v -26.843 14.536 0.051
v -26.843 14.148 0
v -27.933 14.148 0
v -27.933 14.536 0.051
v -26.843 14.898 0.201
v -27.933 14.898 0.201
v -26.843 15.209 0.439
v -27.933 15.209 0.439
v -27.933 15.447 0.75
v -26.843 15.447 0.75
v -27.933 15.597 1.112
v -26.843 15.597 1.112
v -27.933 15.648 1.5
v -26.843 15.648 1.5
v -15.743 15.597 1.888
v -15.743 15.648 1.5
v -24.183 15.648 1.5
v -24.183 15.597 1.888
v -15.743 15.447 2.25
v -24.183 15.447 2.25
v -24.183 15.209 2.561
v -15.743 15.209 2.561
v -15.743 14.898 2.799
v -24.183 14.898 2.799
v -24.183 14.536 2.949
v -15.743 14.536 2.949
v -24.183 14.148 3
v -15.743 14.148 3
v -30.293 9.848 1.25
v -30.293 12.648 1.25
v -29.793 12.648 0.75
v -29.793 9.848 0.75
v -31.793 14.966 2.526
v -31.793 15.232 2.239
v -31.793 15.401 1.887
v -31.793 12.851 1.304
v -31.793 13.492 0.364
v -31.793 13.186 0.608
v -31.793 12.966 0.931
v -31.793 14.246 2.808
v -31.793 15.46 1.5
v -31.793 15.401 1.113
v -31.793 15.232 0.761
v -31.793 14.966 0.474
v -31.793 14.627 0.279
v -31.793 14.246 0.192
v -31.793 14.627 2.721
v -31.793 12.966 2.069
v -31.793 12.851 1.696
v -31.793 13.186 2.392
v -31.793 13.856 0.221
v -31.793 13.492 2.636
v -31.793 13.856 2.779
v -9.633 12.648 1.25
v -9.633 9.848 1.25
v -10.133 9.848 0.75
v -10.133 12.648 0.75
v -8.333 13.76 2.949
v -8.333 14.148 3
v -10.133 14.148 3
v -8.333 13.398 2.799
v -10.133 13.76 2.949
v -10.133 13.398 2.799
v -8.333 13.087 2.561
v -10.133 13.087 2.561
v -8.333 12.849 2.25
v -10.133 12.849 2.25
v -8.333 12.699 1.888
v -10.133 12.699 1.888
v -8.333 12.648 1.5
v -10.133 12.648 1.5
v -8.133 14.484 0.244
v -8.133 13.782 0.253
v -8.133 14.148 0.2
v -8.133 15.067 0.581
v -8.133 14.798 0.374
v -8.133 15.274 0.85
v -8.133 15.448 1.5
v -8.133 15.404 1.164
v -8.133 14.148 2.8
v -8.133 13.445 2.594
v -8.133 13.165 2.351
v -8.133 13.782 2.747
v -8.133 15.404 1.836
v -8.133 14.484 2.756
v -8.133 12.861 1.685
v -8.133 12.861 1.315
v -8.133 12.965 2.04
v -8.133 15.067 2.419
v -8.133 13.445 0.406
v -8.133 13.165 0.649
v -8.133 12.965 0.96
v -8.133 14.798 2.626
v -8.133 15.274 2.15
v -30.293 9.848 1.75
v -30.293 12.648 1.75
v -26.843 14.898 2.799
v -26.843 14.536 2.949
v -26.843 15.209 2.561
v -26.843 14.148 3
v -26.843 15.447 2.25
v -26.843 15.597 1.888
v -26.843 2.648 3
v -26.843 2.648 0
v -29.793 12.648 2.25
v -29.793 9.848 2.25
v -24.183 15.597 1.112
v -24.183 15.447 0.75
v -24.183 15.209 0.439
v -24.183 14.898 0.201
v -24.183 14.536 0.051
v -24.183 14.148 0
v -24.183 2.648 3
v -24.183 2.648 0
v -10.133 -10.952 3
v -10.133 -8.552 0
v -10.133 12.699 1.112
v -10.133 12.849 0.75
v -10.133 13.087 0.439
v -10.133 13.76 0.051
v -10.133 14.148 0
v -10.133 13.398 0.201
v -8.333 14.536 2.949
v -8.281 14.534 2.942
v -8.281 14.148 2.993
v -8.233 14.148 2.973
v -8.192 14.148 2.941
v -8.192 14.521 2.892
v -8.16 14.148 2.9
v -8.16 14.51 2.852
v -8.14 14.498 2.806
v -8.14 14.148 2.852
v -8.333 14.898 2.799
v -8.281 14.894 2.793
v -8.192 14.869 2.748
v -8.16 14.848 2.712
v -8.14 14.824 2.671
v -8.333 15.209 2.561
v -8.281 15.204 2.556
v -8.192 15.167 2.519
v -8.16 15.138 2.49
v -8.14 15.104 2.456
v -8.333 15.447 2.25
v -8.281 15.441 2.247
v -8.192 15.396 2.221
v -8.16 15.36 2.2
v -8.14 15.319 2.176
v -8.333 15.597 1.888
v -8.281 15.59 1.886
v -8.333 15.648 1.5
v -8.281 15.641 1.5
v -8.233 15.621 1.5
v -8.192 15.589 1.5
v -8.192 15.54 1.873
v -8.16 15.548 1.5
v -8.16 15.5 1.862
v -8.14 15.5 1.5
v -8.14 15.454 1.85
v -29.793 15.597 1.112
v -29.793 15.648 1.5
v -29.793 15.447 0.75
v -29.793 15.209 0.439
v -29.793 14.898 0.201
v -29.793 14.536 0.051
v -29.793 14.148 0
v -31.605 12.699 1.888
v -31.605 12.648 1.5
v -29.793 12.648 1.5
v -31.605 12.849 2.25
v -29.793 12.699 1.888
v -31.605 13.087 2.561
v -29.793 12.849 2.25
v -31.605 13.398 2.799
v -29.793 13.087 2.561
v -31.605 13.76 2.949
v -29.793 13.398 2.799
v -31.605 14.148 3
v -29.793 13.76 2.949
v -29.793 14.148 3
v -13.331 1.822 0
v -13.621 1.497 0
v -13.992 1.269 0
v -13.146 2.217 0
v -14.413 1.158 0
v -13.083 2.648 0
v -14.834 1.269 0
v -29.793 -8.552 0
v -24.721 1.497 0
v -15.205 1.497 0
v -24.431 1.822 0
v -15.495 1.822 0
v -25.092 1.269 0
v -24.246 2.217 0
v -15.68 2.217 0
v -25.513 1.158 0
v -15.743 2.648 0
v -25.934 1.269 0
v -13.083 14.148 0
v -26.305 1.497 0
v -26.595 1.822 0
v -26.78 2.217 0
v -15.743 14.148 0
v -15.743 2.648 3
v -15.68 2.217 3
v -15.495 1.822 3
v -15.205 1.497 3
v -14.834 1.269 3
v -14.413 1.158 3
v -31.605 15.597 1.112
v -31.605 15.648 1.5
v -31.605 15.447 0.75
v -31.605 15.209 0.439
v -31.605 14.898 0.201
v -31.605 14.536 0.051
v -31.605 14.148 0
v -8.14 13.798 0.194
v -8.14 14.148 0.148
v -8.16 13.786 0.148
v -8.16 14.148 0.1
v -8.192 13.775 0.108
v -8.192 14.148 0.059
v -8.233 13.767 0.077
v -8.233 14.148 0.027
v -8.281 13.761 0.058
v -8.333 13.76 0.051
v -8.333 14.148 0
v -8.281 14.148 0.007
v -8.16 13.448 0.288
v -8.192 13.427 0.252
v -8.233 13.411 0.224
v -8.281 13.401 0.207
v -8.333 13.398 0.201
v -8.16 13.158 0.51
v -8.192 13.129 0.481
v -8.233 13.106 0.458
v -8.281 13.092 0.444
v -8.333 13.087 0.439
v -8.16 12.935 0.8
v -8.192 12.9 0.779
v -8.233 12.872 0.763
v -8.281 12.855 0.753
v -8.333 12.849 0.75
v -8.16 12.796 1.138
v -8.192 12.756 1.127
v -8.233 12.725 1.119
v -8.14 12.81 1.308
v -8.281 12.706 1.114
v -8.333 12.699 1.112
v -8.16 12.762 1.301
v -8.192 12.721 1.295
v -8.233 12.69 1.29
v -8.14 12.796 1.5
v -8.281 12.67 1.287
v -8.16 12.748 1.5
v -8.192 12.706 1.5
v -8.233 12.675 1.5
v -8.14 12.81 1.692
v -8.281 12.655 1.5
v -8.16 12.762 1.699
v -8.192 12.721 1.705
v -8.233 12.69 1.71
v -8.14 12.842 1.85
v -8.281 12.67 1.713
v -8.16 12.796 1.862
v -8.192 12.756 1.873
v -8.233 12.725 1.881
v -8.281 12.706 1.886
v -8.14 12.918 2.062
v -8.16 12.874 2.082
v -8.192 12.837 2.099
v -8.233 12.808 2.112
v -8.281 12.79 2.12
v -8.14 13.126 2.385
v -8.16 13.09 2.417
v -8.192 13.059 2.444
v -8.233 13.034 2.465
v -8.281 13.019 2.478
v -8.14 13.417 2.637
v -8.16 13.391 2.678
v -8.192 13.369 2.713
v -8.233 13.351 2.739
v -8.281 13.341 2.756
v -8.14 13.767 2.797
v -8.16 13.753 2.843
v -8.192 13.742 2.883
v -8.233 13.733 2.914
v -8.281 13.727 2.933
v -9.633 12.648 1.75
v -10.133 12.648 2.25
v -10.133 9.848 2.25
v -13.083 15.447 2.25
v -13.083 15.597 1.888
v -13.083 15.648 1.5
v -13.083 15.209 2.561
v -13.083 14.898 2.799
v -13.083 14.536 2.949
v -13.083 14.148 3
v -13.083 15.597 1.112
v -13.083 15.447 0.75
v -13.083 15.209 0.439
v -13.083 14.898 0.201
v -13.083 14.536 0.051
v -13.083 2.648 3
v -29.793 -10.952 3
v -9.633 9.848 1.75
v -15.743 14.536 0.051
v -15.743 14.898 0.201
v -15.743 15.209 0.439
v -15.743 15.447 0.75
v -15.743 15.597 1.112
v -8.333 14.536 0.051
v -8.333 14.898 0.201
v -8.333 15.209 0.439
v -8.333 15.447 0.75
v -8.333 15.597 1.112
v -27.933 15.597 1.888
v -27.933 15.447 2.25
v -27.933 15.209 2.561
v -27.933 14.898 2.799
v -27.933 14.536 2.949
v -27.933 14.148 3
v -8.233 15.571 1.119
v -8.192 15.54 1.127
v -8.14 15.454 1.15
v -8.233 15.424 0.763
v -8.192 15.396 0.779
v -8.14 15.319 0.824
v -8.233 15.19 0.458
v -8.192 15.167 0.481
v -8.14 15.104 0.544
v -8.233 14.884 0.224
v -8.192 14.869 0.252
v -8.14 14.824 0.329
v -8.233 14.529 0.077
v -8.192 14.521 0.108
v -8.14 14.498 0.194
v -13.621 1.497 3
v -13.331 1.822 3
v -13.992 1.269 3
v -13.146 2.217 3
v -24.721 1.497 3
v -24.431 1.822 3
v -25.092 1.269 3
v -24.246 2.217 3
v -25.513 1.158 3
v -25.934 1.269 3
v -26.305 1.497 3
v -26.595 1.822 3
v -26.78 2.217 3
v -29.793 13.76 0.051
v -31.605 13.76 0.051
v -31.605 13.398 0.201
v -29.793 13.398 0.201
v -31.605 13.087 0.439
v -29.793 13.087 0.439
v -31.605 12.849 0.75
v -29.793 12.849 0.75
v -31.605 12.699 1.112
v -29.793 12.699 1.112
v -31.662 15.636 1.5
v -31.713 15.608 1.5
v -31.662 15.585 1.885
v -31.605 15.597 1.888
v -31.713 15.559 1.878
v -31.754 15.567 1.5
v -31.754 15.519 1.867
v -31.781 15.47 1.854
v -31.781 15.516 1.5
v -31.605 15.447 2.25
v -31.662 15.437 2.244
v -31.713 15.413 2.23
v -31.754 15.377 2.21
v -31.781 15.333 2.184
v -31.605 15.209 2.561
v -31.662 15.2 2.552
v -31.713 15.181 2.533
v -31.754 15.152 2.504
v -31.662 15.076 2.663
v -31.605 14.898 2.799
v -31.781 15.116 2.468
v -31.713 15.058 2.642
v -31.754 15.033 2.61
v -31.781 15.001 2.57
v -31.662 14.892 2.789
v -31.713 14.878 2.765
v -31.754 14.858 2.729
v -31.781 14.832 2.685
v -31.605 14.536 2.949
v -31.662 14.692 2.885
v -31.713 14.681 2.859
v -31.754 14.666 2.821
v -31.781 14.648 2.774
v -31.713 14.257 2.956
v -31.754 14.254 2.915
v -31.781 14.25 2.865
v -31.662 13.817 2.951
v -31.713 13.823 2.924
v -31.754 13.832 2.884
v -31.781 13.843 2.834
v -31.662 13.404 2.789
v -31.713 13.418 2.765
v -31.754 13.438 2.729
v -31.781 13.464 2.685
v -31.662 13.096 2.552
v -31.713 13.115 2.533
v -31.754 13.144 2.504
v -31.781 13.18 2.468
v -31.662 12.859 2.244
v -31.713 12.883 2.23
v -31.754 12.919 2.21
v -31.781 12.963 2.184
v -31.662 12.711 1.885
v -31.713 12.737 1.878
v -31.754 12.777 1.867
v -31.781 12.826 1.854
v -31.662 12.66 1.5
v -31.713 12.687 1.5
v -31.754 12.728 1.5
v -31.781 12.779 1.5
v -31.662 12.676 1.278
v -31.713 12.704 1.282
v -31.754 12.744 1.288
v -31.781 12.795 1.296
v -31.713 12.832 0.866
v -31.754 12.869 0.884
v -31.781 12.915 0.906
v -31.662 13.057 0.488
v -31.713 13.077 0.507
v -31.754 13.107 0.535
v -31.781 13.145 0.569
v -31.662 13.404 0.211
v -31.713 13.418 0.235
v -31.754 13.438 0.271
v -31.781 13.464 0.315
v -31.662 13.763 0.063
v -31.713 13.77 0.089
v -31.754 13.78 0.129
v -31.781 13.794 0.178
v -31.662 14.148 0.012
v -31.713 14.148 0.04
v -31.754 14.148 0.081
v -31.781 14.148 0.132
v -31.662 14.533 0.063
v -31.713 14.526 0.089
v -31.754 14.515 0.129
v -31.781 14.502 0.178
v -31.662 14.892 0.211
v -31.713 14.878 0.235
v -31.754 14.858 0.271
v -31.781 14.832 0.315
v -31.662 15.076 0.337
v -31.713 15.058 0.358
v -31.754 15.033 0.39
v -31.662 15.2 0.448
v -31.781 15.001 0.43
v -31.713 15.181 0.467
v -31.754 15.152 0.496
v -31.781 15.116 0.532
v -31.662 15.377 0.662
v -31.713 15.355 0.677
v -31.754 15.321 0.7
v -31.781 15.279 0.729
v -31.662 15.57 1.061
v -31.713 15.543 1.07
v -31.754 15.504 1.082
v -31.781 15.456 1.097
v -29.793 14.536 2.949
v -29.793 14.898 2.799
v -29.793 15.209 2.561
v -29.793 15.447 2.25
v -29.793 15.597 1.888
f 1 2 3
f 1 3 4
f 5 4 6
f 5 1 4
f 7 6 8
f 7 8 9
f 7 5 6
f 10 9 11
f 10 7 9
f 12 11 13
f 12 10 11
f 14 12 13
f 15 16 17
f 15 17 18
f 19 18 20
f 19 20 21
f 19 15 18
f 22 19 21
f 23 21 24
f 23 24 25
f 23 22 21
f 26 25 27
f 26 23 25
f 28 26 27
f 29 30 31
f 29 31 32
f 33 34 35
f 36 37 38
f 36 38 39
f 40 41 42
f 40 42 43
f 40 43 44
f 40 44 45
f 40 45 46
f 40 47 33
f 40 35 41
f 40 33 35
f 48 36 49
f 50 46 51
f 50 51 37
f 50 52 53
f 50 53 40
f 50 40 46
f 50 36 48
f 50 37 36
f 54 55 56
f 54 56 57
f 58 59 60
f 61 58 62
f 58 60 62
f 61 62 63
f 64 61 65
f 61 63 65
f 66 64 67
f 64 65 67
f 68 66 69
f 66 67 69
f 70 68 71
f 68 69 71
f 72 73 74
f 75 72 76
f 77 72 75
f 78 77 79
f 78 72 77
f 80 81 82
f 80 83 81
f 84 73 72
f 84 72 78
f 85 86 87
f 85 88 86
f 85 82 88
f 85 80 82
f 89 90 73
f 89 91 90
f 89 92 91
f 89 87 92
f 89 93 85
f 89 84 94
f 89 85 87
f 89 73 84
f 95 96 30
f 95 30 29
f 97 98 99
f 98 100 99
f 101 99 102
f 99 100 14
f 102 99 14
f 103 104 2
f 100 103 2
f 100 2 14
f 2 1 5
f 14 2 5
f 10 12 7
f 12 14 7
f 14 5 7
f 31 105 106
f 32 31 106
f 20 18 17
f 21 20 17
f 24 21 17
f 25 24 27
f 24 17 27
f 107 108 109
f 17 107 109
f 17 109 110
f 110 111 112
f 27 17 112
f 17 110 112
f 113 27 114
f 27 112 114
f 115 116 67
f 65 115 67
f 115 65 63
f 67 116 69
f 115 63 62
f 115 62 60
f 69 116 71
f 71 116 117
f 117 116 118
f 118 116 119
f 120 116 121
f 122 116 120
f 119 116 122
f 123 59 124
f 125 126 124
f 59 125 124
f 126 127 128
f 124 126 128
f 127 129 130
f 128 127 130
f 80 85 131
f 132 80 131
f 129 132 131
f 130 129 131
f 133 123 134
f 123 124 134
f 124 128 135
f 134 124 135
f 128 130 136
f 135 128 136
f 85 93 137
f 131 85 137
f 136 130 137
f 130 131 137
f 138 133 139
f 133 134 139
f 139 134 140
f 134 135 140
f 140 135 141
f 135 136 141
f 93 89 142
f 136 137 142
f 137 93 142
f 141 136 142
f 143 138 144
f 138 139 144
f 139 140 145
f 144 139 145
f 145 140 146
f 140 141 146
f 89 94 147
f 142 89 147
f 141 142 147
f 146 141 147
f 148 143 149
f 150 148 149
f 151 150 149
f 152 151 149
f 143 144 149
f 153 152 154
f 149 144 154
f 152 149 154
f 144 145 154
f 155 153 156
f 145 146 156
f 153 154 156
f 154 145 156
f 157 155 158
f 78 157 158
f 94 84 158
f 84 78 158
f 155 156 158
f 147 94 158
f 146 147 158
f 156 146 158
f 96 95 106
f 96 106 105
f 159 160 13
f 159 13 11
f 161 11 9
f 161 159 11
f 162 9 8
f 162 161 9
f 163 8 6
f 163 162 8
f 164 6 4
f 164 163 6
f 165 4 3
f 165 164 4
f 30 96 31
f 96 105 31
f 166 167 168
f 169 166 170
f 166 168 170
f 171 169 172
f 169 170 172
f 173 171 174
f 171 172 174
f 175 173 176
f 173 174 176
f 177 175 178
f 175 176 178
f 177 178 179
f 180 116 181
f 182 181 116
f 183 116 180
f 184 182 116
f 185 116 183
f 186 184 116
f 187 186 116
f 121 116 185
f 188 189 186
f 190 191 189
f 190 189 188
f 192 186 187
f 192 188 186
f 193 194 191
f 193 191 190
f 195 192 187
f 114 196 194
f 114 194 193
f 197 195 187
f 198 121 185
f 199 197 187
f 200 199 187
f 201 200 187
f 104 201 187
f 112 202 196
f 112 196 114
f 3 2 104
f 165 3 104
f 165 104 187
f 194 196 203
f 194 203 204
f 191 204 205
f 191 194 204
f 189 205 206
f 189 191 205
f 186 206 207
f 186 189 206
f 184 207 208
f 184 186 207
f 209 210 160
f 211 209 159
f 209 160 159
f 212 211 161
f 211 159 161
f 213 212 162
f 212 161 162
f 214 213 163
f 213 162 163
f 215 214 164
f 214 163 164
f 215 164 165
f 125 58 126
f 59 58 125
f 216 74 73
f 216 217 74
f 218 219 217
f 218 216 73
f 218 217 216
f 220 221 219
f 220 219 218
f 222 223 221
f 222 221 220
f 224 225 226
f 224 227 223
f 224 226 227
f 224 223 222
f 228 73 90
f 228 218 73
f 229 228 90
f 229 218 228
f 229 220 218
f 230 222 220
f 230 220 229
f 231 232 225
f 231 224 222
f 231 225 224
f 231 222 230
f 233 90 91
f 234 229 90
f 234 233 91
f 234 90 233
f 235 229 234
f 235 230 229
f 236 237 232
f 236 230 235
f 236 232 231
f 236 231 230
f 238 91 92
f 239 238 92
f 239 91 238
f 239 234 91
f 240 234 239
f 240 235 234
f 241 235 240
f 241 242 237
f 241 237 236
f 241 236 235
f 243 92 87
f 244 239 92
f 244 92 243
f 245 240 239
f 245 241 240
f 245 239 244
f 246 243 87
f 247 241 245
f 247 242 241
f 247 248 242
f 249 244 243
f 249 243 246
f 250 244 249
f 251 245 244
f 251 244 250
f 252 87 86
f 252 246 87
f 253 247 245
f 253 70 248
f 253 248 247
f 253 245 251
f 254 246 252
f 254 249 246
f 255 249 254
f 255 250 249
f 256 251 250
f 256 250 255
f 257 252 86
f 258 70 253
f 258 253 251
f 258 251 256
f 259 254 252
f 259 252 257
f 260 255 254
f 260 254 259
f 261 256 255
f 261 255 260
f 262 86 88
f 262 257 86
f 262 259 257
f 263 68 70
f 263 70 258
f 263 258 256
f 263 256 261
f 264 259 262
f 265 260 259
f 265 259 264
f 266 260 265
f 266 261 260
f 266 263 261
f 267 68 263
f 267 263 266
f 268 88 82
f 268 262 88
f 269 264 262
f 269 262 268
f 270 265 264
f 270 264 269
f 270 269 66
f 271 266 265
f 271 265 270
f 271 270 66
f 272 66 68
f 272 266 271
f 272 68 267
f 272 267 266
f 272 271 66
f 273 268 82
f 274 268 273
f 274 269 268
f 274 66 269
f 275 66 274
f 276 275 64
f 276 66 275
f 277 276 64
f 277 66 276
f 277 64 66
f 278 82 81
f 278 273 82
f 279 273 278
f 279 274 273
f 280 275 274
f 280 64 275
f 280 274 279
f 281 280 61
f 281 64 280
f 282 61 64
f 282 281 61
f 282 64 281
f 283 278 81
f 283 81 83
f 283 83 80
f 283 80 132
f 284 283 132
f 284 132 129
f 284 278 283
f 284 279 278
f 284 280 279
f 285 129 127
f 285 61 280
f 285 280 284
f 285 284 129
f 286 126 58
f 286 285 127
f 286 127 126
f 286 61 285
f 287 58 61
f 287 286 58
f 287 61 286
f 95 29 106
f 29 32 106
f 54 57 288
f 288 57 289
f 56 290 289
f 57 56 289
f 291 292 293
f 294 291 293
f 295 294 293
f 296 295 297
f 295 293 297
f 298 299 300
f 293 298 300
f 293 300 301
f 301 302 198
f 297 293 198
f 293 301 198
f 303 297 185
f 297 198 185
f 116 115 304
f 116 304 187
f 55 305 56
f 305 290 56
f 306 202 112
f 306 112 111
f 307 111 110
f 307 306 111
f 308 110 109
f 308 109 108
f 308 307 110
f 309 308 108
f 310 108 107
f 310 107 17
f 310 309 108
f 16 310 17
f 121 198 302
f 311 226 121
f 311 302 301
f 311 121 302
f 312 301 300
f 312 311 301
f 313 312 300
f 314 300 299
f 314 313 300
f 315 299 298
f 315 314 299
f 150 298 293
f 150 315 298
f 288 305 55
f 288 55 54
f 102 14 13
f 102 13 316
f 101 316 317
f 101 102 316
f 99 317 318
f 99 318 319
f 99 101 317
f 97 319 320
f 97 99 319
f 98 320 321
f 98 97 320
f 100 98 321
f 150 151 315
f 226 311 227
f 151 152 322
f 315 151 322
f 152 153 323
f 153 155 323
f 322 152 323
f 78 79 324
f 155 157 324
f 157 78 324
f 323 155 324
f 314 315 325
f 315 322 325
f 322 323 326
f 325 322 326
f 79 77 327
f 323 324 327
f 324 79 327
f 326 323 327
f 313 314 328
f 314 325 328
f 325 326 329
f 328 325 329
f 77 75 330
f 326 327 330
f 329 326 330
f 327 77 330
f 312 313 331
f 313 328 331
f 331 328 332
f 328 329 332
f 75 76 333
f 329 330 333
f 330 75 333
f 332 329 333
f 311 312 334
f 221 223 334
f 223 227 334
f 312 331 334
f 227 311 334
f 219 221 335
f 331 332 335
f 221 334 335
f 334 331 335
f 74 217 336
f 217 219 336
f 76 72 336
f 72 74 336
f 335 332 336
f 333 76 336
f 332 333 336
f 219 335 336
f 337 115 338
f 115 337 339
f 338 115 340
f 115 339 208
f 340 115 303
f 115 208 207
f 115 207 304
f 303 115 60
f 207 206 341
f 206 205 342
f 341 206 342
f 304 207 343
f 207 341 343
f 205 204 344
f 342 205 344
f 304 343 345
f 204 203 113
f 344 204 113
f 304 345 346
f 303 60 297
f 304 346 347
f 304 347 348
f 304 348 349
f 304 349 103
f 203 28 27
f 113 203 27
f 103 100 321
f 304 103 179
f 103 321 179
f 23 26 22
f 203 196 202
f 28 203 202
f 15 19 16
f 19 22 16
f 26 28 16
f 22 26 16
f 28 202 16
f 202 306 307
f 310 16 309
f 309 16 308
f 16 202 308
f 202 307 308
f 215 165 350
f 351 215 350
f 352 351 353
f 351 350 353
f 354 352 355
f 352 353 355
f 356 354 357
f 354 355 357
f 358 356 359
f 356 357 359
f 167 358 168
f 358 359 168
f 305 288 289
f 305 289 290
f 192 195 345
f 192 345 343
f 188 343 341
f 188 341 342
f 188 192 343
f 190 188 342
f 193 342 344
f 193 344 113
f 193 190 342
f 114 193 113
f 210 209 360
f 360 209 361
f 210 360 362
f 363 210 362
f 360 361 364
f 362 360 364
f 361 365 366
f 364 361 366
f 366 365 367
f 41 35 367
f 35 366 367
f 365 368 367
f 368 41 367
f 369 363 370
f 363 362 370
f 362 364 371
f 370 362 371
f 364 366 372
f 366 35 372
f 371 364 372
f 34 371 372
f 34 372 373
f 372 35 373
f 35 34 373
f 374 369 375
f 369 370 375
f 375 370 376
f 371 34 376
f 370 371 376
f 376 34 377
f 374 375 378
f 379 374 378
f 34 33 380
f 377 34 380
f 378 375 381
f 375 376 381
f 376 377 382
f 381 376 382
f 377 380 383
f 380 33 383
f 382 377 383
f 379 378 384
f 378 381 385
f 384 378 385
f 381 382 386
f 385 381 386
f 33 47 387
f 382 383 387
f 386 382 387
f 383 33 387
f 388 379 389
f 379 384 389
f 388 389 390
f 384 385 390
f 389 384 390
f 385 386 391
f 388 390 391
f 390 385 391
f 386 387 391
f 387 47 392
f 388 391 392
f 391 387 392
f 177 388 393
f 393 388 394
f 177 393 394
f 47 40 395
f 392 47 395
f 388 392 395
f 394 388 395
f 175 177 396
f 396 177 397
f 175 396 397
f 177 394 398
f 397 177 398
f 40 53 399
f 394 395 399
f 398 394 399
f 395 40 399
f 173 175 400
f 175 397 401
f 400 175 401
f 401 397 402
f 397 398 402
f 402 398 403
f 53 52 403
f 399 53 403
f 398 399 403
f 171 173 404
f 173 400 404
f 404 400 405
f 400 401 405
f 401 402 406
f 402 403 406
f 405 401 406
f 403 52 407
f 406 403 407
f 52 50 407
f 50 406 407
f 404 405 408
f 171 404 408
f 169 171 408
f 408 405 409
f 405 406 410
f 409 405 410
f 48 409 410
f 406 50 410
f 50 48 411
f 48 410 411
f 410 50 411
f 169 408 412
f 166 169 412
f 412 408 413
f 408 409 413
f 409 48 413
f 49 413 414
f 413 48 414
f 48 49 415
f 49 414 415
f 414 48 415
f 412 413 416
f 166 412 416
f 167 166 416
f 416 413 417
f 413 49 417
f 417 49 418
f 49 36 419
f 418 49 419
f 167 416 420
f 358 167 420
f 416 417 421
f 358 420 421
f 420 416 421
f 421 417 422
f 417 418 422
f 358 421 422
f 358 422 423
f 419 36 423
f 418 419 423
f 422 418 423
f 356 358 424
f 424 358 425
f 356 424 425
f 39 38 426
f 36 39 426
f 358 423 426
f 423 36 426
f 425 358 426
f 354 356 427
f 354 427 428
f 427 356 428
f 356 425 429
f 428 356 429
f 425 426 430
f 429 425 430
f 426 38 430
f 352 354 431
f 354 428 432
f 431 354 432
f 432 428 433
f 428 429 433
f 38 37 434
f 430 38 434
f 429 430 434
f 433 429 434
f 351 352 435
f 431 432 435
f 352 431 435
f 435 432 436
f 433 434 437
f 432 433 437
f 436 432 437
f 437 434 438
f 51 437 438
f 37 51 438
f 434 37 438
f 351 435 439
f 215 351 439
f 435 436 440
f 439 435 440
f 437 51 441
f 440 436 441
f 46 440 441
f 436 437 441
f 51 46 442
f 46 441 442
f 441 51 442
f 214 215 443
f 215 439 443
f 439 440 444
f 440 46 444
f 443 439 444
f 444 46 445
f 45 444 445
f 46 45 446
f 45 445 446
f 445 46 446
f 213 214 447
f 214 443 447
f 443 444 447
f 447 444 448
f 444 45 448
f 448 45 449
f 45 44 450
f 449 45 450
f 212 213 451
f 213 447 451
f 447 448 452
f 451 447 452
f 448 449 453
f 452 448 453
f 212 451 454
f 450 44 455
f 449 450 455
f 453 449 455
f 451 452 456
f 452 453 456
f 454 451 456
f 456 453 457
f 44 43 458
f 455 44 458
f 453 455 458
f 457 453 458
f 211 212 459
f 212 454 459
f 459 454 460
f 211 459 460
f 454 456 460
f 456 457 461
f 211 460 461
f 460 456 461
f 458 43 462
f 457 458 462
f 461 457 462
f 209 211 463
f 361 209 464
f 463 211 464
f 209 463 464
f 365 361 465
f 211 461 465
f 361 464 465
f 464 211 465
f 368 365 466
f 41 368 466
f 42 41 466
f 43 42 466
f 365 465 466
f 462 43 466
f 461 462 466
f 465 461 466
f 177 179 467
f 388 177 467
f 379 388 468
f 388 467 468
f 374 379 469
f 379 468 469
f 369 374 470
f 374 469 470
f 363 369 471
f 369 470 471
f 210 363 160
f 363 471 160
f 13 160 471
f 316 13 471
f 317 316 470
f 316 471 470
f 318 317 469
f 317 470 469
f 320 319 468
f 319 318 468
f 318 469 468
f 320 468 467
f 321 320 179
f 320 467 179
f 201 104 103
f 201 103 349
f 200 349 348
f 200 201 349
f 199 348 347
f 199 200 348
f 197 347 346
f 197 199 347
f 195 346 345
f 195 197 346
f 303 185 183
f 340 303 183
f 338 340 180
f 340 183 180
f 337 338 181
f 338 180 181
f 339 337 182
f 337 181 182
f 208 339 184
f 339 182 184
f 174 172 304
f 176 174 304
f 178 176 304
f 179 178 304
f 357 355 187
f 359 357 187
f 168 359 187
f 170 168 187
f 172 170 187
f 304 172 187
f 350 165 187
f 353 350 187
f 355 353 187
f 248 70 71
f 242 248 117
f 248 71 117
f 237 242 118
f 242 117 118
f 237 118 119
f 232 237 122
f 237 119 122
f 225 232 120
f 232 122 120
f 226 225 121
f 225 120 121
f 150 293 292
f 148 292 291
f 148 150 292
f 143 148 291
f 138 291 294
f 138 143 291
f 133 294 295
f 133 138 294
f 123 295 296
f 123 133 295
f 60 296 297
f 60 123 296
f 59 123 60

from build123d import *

# Parameters (mm, degrees)
F1_DEPTH      = 3
F3_DEPTH      = 2
F5_DEPTH      = 2
F6_DEPTH      = 0.5
F7_SIZE       = 0.49999
F8_DEPTH      = 0.5
F9_SIZE       = 0.49999
F10_DEPTH     = 19.66
F11_R         = 1.4999
F12_T3_DEPTH  = 3
F12_T6_DEPTH  = 3
F12_T9_DEPTH  = 3
F12_T12_DEPTH = 3
F12_T16_DEPTH = 15.94
F12_T19_DEPTH = 10.45
F12_T22_DEPTH = 15.94
F12_T25_DEPTH = 10.45
F14_T3_ANGLE  = 179.9999999988
F14_T6_ANGLE  = 90
F14_T9_ANGLE  = 90.0000000012


# Not quite as in the source:
# - a fillet or chamfer that OpenCascade refuses, or shapes differently, is made with other operations: its cross-section is extruded or revolved along the edge and cut away or added
# - two fillets or chamfers of one size are made in one step
# - a fillet or chamfer is up to 0.001 mm smaller than in the source, because OpenCascade refuses the exact size


with BuildPart() as f1:
    # F0 (on Top) → F1 (new body)
    with BuildSketch(Plane.XY):
        Polygon((-26.8430960169, 15.6478737652), (-29.7930960169, 15.6478737652), (-29.7930960169, -10.9521262348), (-10.1330960169, -10.9521262348), (-10.1330960169, 15.6478737652), (-13.0830960169, 15.6478737652), (-13.0830960169, 1.1478737652), (-15.7430960169, 1.1478737652), (-15.7430960169, 15.6478737652), (-24.1830960169, 15.6478737652), (-24.1830960169, 1.1478737652), (-26.8430960169, 1.1478737652), align=None)
    extrude(amount=F1_DEPTH)

    # F2 (on face) → F3 (join)
    with BuildSketch(Plane.YZ.offset(-10.1330960169)):
        with BuildLine():
            ThreePointArc((14.1478737652, 0), (15.208533937, 0.4393398282), (15.6478737652, 1.5))
            ThreePointArc((15.6478737652, 1.5), (15.208533937, 2.5606601718), (14.1478737652, 3))
            ThreePointArc((14.1478737652, 3), (13.0872135935, 2.5606601718), (12.6478737652, 1.5))
            ThreePointArc((12.6478737652, 1.5), (13.0872135935, 0.4393398282), (14.1478737652, 0))
        make_face()
    extrude(amount=F3_DEPTH)

    # F4 (on face) → F5 (join)
    with BuildSketch(Plane(origin=(-29.7930960169, 0, 0), x_dir=(0, -1, 0), z_dir=(-1, 0, 0))):
        with BuildLine():
            ThreePointArc((-14.1478737652, 0), (-13.0872135935, 0.4393398282), (-12.6478737652, 1.5))
            ThreePointArc((-12.6478737652, 1.5), (-13.0872135935, 2.5606601718), (-14.1478737652, 3))
            ThreePointArc((-14.1478737652, 3), (-15.2085339334, 2.5606601754), (-15.6478737652, 1.5000000103))
            ThreePointArc((-15.6478737652, 1.5000000103), (-15.2085339407, 0.4393398319), (-14.1478737652, 0))
        make_face()
    extrude(amount=F5_DEPTH)

    # F4 (on face) → F10 (cut, through all)
    with BuildSketch(Plane(origin=(-29.7930960169, 0, 0), x_dir=(0, -1, 0), z_dir=(-1, 0, 0))):
        Polygon((10.9521262348, 0), (10.9521262348, 3), (8.5521262348, 0), align=None)
    extrude(amount=-F10_DEPTH, mode=Mode.SUBTRACT)

    # F11 (radius 1.5 in the source; OpenCascade refuses exactly that, so slightly less here)
    f11_edges = [f1.edges().sort_by_distance(p)[0] for p in [
        (-28.318096, 15.647874, 3),
        (-28.318096, 15.647874, 0),
    ]]
    fillet(f11_edges, radius=F11_R)

    # F12: fillet of radius 1.5 on 8 edges, made by hand


with BuildPart() as f6:
    # F4 (on face) → F6 (new body)
    with BuildSketch(Plane(origin=(-29.7930960169, 0, 0), x_dir=(0, -1, 0), z_dir=(-1, 0, 0))):
        Polygon((-12.6478737652, 2.25), (-12.6478737652, 1.5), (-12.6478737652, 0.75), (-9.8478737652, 0.75), (-9.8478737652, 1.5), (-9.8478737652, 2.25), align=None)
    extrude(amount=F6_DEPTH)

    # F7 (size 0.5 in the source; OpenCascade refuses exactly that, so slightly less here)
    f7_edges = [f6.edges().sort_by_distance(p)[0] for p in [
        (-30.293096, 11.247874, 0.75),
        (-30.293096, 11.247874, 2.25),
    ]]
    chamfer(f7_edges, length=F7_SIZE)


with BuildPart() as f8:
    # F2 (on face) → F8 (new body)
    with BuildSketch(Plane.YZ.offset(-10.1330960169)):
        Polygon((12.6478737652, 0.75), (12.6478737652, 1.5), (12.6478737652, 2.25), (9.8478737652, 2.25), (9.8478737652, 0.75), align=None)
    extrude(amount=F8_DEPTH)

    # F9 (size 0.5 in the source; OpenCascade refuses exactly that, so slightly less here)
    f9_edges = [f8.edges().sort_by_distance(p)[0] for p in [
        (-9.633096, 11.247874, 2.25),
        (-9.633096, 11.247874, 0.75),
    ]]
    chamfer(f9_edges, length=F9_SIZE)


with BuildPart() as f12_tool1:
    # F12_s2 → F12_t3 (new body)
    with BuildSketch(Plane.XY):
        with BuildLine():
            ThreePointArc((-26.8430960169, 2.6478737652), (-26.4037561887, 1.5872135935), (-25.3430960169, 1.1478737652))
            Line((-25.3430960169, 1.1478737652), (-26.8430960169, 1.1478737652))
            Line((-26.8430960169, 1.1478737652), (-26.8430960169, 2.6478737652))
        make_face()
    extrude(amount=F12_T3_DEPTH)


with BuildPart() as f12_tool4:
    # F12_s5 → F12_t6 (new body)
    with BuildSketch(Plane.XY):
        with BuildLine():
            ThreePointArc((-25.6830960169, 1.1478737652), (-24.6224358452, 1.5872135935), (-24.1830960169, 2.6478737652))
            Line((-24.1830960169, 2.6478737652), (-24.1830960169, 1.1478737652))
            Line((-24.1830960169, 1.1478737652), (-25.6830960169, 1.1478737652))
        make_face()
    extrude(amount=F12_T6_DEPTH)


with BuildPart() as f12_tool7:
    # F12_s8 → F12_t9 (new body)
    with BuildSketch(Plane.XY):
        with BuildLine():
            ThreePointArc((-15.7430960169, 2.6478737652), (-15.3037561887, 1.5872135935), (-14.2430960169, 1.1478737652))
            Line((-14.2430960169, 1.1478737652), (-15.7430960169, 1.1478737652))
            Line((-15.7430960169, 1.1478737652), (-15.7430960169, 2.6478737652))
        make_face()
    extrude(amount=F12_T9_DEPTH)


with BuildPart() as f12_tool10:
    # F12_s11 → F12_t12 (new body)
    with BuildSketch(Plane.XY):
        with BuildLine():
            ThreePointArc((-13.0830960169, 2.6478737652), (-13.5224358452, 1.5872135935), (-14.5830960169, 1.1478737652))
            Line((-14.5830960169, 1.1478737652), (-13.0830960169, 1.1478737652))
            Line((-13.0830960169, 1.1478737652), (-13.0830960169, 2.6478737652))
        make_face()
    extrude(amount=F12_T12_DEPTH)


with BuildPart() as f1_1:
    add(f1.part)

    # F12_t13: union F12_tool1, F12_tool4, F12_tool7, F12_tool10
    add([f12_tool1.part, f12_tool4.part, f12_tool7.part, f12_tool10.part])


with BuildPart() as f12_tool14:
    # F12_s15 → F12_t16 (new body)
    with BuildSketch(Plane.YZ.offset(-11.9930960169)):
        with BuildLine():
            ThreePointArc((14.1478737652, 0), (15.208533937, 0.4393398282), (15.6478737652, 1.5))
            Line((15.6478737652, 1.5), (15.6478737652, 0))
            Line((15.6478737652, 0), (14.1478737652, 0))
        make_face()
    extrude(amount=-F12_T16_DEPTH)


with BuildPart() as f12_tool17:
    # F12_s18 → F12_t19 (new body)
    with BuildSketch(Plane.YZ.offset(-6.3830960169)):
        with BuildLine():
            ThreePointArc((14.1478737652, 0), (15.208533937, 0.4393398282), (15.6478737652, 1.5))
            Line((15.6478737652, 1.5), (15.6478737652, 0))
            Line((15.6478737652, 0), (14.1478737652, 0))
        make_face()
    extrude(amount=-F12_T19_DEPTH)


with BuildPart() as f12_tool20:
    # F12_s21 → F12_t22 (new body)
    with BuildSketch(Plane.YZ.offset(-11.9930960169)):
        with BuildLine():
            ThreePointArc((15.6478737652, 1.5), (15.208533937, 2.5606601718), (14.1478737652, 3))
            Line((14.1478737652, 3), (15.6478737652, 3))
            Line((15.6478737652, 3), (15.6478737652, 1.5))
        make_face()
    extrude(amount=-F12_T22_DEPTH)


with BuildPart() as f12_tool23:
    # F12_s24 → F12_t25 (new body)
    with BuildSketch(Plane.YZ.offset(-6.3830960169)):
        with BuildLine():
            ThreePointArc((15.6478737652, 1.5), (15.208533937, 2.5606601718), (14.1478737652, 3))
            Line((14.1478737652, 3), (15.6478737652, 3))
            Line((15.6478737652, 3), (15.6478737652, 1.5))
        make_face()
    extrude(amount=-F12_T25_DEPTH)


with BuildPart() as f1_2:
    add(f1_1.part)

    # F12_t26: cut F12_tool14, F12_tool17, F12_tool20, F12_tool23
    add([f12_tool14.part, f12_tool17.part, f12_tool20.part, f12_tool23.part], mode=Mode.SUBTRACT)

    # F14: fillet of radius 0.2 on 1 edges, made by hand


with BuildPart() as f14_tool1:
    # F14_s2 → F14_t3 (revolve)
    with BuildSketch(Plane.XZ.offset(-14.1478737652)):
        with BuildLine():
            ThreePointArc((-8.1330960169, 0.2), (-8.1916746607, 0.0585786438), (-8.3330960169, 0))
            Line((-8.3330960169, 0), (-8.1330960169, 0))
            Line((-8.1330960169, 0), (-8.1330960169, 0.2))
        make_face()
    revolve(axis=Axis((-8.1330960169, 14.1478737652, 1.5), (-1, 0, 0)), revolution_arc=F14_T3_ANGLE)


with BuildPart() as f14_tool4:
    # F14_s5 → F14_t6 (revolve)
    with BuildSketch(Plane.XY.offset(1.5)):
        with BuildLine():
            ThreePointArc((-8.3330960169, 15.6478737652), (-8.1916746607, 15.5892951215), (-8.1330960169, 15.4478737652))
            Line((-8.1330960169, 15.4478737652), (-8.1330960169, 15.6478737652))
            Line((-8.1330960169, 15.6478737652), (-8.3330960169, 15.6478737652))
        make_face()
    revolve(axis=Axis((-8.1330960169, 14.1478737652, 1.5), (-1, 0, 0)), revolution_arc=F14_T6_ANGLE)


with BuildPart() as f14_tool7:
    # F14_s8 → F14_t9 (revolve)
    with BuildSketch(Plane.XZ.offset(-14.1478737652)):
        with BuildLine():
            ThreePointArc((-8.3330960169, 3), (-8.1916746607, 2.9414213562), (-8.1330960169, 2.8))
            Line((-8.1330960169, 2.8), (-8.1330960169, 3))
            Line((-8.1330960169, 3), (-8.3330960169, 3))
        make_face()
    revolve(axis=Axis((-8.1330960169, 14.1478737652, 1.5), (-1, 0, 0)), revolution_arc=F14_T9_ANGLE)


with BuildPart() as f1_3:
    add(f1_2.part)

    # F14_t10: cut F14_tool1, F14_tool4, F14_tool7
    add([f14_tool1.part, f14_tool4.part, f14_tool7.part], mode=Mode.SUBTRACT)

    # F15: fillet of radius 0.2 on 1 edges, made by hand

    # F15_s1 → F15_t2 (revolve, cut)
    with BuildSketch(Plane.XY.offset(1.5)):
        with BuildLine():
            ThreePointArc((-31.5921303315, 15.6482737652), (-31.7345173732, 15.5892951215), (-31.7934960169, 15.4469080798))
            Line((-31.7934960169, 15.4469080798), (-31.8136325855, 15.4469080798))
            ThreePointArc((-31.8136325855, 15.4469080798), (-31.8132325855, 15.5473909225), (-31.8132325855, 15.6478737652))
            Line((-31.8132325855, 15.6478737652), (-31.7930960169, 15.6680103338))
            ThreePointArc((-31.7930960169, 15.6680103338), (-31.6926131742, 15.6680103338), (-31.5921303315, 15.6684103338))
            Line((-31.5921303315, 15.6684103338), (-31.5921303315, 15.6482737652))
        make_face()
    revolve(axis=Axis((-31.7930960169, 14.1478737652, 1.5), (1, 0, 0)), mode=Mode.SUBTRACT)


solid = Compound([f6.part, f8.part, f1_3.part])
